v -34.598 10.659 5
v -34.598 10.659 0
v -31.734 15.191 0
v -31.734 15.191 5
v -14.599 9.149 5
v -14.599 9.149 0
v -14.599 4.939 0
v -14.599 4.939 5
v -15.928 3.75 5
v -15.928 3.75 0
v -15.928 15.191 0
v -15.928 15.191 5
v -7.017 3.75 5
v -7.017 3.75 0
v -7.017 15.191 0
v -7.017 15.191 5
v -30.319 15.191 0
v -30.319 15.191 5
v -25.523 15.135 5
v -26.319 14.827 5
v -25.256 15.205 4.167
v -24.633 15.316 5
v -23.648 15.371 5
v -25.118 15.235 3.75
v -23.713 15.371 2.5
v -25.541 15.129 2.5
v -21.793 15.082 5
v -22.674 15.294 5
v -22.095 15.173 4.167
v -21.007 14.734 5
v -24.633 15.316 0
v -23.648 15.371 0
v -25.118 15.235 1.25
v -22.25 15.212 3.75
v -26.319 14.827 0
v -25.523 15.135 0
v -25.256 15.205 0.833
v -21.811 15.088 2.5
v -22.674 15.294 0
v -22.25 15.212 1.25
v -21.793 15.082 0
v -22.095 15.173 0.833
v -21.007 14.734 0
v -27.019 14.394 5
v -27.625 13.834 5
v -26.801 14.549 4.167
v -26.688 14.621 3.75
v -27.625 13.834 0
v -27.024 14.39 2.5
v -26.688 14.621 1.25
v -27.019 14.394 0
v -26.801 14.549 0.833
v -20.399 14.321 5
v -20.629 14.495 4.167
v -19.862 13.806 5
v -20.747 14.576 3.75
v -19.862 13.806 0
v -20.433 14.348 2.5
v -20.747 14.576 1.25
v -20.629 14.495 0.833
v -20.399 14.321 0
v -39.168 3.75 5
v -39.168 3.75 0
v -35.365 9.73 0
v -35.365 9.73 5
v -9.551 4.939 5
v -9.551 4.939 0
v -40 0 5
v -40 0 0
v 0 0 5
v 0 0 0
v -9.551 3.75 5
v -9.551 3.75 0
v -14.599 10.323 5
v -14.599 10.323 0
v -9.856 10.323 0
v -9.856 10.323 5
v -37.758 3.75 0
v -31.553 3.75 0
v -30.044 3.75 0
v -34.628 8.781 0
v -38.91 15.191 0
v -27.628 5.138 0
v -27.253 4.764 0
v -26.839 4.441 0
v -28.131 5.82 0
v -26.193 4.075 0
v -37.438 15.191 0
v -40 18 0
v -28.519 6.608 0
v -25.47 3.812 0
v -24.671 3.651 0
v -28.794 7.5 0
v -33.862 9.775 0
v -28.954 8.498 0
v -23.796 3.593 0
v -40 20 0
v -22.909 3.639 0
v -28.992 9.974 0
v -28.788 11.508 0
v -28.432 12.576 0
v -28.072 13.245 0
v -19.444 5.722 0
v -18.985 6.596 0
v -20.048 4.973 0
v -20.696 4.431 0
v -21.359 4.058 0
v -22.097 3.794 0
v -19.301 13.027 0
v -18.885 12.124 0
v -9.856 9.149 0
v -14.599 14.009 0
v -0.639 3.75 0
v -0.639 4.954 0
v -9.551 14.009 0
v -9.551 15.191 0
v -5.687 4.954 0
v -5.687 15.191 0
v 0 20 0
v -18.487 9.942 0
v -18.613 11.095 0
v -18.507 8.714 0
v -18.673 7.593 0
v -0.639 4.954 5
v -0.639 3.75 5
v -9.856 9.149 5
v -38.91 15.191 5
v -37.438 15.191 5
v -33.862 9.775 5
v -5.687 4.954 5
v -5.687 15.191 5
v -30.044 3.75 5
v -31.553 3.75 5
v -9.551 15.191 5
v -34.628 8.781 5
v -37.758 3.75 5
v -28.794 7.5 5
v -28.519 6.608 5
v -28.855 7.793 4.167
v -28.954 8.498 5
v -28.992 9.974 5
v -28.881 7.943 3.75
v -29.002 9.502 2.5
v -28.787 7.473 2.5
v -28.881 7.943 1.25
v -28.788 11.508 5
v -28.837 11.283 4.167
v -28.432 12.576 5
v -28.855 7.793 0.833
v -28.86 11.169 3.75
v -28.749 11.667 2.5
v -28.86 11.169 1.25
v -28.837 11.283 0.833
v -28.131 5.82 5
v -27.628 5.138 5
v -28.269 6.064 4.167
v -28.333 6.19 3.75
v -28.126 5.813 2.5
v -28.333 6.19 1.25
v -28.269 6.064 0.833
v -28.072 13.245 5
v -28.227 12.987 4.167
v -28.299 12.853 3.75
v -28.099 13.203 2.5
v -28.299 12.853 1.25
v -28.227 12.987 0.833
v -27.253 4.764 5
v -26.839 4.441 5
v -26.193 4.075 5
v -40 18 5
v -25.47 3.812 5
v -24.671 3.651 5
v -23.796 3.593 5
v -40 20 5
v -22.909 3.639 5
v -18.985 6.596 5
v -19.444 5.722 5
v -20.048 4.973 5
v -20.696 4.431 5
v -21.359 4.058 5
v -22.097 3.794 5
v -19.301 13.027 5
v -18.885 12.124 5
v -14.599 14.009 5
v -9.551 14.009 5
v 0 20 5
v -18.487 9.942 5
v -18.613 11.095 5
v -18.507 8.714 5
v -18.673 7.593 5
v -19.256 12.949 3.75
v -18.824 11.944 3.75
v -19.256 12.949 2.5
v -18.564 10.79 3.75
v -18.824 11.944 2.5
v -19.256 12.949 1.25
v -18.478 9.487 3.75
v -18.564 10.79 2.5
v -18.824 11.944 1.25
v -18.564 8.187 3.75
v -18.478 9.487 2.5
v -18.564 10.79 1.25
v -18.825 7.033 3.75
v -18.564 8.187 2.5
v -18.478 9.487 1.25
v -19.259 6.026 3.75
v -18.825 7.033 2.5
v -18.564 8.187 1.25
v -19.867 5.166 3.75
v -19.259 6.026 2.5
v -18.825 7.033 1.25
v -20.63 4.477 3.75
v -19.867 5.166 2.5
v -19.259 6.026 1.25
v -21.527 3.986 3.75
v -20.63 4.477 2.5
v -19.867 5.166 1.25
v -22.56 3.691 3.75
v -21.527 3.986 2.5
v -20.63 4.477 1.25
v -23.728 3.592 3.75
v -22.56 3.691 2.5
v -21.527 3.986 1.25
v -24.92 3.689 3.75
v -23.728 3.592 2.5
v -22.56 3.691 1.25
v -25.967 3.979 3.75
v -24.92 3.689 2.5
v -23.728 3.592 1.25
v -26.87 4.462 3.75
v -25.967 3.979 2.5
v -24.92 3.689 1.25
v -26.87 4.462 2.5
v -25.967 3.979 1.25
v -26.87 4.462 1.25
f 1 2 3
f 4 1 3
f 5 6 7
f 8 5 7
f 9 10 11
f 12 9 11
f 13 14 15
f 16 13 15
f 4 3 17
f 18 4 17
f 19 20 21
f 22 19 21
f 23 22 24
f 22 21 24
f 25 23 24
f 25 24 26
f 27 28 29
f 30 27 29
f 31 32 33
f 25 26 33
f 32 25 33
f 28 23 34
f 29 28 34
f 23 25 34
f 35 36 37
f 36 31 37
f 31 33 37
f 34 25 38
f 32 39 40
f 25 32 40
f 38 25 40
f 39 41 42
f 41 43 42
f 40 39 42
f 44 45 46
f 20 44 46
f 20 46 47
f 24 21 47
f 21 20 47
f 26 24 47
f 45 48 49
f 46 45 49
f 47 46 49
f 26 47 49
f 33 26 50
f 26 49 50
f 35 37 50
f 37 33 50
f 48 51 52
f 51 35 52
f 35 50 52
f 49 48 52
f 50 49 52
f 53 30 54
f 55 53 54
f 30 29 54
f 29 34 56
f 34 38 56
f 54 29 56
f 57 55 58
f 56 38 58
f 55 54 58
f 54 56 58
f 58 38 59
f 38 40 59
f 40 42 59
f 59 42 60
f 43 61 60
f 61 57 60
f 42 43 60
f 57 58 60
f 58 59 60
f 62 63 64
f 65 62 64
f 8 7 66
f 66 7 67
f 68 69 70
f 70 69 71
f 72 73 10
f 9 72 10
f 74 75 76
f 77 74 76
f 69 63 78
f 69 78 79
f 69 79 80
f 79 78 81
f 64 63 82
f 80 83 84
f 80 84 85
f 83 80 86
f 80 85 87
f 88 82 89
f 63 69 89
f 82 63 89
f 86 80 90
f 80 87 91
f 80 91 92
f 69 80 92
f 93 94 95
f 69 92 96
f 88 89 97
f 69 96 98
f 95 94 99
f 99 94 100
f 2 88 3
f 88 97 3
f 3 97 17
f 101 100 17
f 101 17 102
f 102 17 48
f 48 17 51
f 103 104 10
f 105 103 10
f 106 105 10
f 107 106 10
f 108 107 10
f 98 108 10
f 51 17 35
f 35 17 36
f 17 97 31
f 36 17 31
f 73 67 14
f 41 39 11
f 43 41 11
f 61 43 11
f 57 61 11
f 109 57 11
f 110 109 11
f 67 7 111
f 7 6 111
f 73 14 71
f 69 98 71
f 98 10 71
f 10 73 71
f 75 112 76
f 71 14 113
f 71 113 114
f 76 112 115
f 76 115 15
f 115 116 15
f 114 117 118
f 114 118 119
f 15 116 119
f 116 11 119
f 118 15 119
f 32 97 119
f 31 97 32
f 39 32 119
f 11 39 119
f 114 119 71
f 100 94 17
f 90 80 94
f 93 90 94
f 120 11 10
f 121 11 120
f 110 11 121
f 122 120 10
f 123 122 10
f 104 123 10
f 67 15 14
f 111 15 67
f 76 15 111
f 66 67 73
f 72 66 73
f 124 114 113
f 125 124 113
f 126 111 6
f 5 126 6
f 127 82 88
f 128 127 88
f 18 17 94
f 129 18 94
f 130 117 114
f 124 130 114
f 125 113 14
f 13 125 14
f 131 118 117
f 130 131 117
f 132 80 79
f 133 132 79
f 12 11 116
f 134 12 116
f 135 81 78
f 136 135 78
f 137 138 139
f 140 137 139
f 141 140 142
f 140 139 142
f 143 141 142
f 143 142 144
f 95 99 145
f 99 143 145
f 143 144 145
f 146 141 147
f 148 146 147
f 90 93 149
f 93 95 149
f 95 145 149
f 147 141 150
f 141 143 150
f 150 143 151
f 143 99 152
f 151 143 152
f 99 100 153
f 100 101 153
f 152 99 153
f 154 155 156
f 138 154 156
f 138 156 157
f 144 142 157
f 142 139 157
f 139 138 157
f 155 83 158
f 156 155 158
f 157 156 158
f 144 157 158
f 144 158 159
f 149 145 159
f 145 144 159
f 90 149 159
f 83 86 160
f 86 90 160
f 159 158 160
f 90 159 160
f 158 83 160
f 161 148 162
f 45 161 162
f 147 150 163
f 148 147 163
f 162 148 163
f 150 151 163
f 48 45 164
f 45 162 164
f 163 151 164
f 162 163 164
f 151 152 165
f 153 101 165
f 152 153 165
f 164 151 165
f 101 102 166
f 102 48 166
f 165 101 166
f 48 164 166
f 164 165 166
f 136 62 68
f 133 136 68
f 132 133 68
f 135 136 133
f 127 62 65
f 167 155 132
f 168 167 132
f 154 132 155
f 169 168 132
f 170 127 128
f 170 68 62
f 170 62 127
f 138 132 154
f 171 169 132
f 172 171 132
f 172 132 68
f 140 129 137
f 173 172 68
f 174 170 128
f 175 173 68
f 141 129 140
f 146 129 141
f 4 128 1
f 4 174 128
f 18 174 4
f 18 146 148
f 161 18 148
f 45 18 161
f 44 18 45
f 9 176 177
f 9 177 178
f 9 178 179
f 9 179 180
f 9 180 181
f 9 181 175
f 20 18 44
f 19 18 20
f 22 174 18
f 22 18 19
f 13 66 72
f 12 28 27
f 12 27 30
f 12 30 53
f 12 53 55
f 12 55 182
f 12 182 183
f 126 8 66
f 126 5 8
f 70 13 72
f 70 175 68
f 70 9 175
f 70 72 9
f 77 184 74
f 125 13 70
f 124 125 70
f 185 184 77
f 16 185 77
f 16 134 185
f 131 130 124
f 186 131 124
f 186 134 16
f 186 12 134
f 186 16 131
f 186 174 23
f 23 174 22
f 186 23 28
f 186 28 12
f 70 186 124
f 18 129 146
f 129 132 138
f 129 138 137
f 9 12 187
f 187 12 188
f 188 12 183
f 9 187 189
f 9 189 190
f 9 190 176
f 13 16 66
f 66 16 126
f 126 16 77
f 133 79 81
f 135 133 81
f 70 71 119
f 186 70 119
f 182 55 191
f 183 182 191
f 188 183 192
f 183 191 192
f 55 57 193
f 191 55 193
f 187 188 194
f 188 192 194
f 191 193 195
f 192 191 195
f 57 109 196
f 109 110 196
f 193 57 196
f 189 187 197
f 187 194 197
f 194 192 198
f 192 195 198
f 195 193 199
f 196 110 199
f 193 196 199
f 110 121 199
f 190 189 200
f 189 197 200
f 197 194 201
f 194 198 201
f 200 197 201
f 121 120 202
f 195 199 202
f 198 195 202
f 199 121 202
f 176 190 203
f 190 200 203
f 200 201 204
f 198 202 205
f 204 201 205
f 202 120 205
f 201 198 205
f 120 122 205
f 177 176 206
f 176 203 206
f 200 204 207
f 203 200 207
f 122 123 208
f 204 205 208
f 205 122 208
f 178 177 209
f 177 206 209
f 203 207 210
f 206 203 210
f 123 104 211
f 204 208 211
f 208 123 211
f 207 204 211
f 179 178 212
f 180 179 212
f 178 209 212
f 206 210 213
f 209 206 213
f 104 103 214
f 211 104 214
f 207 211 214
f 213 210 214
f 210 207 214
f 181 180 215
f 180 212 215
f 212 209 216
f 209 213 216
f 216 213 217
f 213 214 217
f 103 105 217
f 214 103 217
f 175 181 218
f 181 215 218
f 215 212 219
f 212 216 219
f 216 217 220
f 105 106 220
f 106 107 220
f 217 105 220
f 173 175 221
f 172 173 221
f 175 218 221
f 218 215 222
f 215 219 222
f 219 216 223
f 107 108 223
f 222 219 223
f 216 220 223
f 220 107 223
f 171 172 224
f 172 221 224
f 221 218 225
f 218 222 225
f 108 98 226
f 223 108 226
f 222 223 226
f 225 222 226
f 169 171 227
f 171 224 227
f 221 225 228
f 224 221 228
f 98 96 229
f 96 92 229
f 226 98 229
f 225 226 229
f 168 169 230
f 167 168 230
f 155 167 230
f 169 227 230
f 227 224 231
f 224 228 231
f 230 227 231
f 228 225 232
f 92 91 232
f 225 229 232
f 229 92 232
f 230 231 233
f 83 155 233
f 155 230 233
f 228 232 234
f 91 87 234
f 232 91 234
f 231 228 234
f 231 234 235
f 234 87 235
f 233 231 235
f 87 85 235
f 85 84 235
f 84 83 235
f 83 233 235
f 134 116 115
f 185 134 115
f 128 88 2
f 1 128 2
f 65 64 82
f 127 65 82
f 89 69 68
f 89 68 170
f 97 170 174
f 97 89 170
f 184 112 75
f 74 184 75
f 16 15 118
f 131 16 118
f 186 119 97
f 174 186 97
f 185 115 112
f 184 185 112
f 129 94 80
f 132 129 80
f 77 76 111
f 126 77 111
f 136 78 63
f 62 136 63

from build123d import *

# Parameters (mm, degrees)
F0_W     = 7.3027783253
F0_H     = 2
F1_DEPTH = 5


with BuildPart() as f1:
    # F0 (on Top) → F1 (new body)
    with BuildSketch(Plane.XY):
        Polygon((-6.9230771488, 20), (-32.6972216747, 20), (-32.6972216747, 18), (-40, 18), (-40, 0), (0, 0), (0, 20), align=None)
        Polygon((-33.8621847978, 9.7746401855), (-30.0435746334, 3.750000149), (-31.5534906525, 3.750000149), (-34.6284108374, 8.7805495395), (-37.7584191689, 3.750000149), (-39.1681749214, 3.750000149), (-35.364588797, 9.7295680656), (-38.9102622349, 15.1908066024), (-37.4379063158, 15.1908066024), (-34.5983627574, 10.6585545384), (-31.7337791324, 15.1908066024), (-30.3190153665, 15.1908066024), align=None, mode=Mode.SUBTRACT)
        with BuildLine():
            add(Edge.make_bspline(
                [(-19.8622835325, 13.8060909166), (-18.4775678467, 12.2410867508), (-18.4775678467, 9.486679419)],
                knots=[0, 0, 0, 1, 1, 1], degree=2))
            add(Edge.make_bspline(
                [(-18.4775678467, 9.486679419), (-18.4775678467, 6.7397841073), (-19.8672915459, 5.1660159182)],
                knots=[0, 0, 0, 1, 1, 1], degree=2))
            add(Edge.make_bspline(
                [(-19.8672915459, 5.1660159182), (-21.2570152451, 3.5922477291), (-23.7284698237, 3.5922477291)],
                knots=[0, 0, 0, 1, 1, 1], degree=2))
            add(Edge.make_bspline(
                [(-23.7284698237, 3.5922477291), (-26.2550125489, 3.5922477291), (-27.6284602047, 5.1384718449)],
                knots=[0, 0, 0, 1, 1, 1], degree=2))
            add(Edge.make_bspline(
                [(-27.6284602047, 5.1384718449), (-29.0019078606, 6.6846959607), (-29.0019078606, 9.501703459)],
                knots=[0, 0, 0, 1, 1, 1], degree=2))
            add(Edge.make_bspline(
                [(-29.0019078606, 9.501703459), (-29.0019078606, 12.2961748974), (-27.6247041947, 13.8336349899)],
                knots=[0, 0, 0, 1, 1, 1], degree=2))
            add(Edge.make_bspline(
                [(-27.6247041947, 13.8336349899), (-26.2475005289, 15.3710950823), (-23.7134457837, 15.3710950823)],
                knots=[0, 0, 0, 1, 1, 1], degree=2))
            add(Edge.make_bspline(
                [(-23.7134457837, 15.3710950823), (-21.2469992184, 15.3710950823), (-19.8622835325, 13.8060909166)],
                knots=[0, 0, 0, 1, 1, 1], degree=2))
        make_face(mode=Mode.SUBTRACT)
        Polygon((-9.5507840851, 4.939403315), (-9.5507840851, 3.750000149), (-15.9284890615, 3.750000149), (-15.9284890615, 15.1908066024), (-9.5507840851, 15.1908066024), (-9.5507840851, 14.0089154564), (-14.5988615222, 14.0089154564), (-14.5988615222, 10.3230176452), (-9.8562728983, 10.3230176452), (-9.8562728983, 9.1486385192), (-14.5988615222, 9.1486385192), (-14.5988615222, 4.939403315), align=None, mode=Mode.SUBTRACT)
        Polygon((-0.6390243636, 3.750000149), (-7.0167293399, 3.750000149), (-7.0167293399, 15.1908066024), (-5.6871018007, 15.1908066024), (-5.6871018007, 4.954427355), (-0.6390243636, 4.954427355), align=None, mode=Mode.SUBTRACT)
        with BuildLine():
            ThreePointArc((-4.5192325674, 17.596155405), (-8.6228519812, 15.8963805958), (-6.9230771488, 20))
            ThreePointArc((-6.9230771488, 20), (-5.2233023436, 19.2959302143), (-4.5192325674, 17.596155405))
        make_face(mode=Mode.SUBTRACT)
        with BuildLine():
            ThreePointArc((-4.5192325674, 17.596155405), (-5.2233023436, 19.2959302143), (-6.9230771488, 20))
            ThreePointArc((-6.9230771488, 20), (-8.6228519812, 15.8963805958), (-4.5192325674, 17.596155405))
        make_face()
        with Locations((-36.3486108374, 19)):
            Rectangle(F0_W, F0_H)
    extrude(amount=F1_DEPTH)


solid = f1.part
